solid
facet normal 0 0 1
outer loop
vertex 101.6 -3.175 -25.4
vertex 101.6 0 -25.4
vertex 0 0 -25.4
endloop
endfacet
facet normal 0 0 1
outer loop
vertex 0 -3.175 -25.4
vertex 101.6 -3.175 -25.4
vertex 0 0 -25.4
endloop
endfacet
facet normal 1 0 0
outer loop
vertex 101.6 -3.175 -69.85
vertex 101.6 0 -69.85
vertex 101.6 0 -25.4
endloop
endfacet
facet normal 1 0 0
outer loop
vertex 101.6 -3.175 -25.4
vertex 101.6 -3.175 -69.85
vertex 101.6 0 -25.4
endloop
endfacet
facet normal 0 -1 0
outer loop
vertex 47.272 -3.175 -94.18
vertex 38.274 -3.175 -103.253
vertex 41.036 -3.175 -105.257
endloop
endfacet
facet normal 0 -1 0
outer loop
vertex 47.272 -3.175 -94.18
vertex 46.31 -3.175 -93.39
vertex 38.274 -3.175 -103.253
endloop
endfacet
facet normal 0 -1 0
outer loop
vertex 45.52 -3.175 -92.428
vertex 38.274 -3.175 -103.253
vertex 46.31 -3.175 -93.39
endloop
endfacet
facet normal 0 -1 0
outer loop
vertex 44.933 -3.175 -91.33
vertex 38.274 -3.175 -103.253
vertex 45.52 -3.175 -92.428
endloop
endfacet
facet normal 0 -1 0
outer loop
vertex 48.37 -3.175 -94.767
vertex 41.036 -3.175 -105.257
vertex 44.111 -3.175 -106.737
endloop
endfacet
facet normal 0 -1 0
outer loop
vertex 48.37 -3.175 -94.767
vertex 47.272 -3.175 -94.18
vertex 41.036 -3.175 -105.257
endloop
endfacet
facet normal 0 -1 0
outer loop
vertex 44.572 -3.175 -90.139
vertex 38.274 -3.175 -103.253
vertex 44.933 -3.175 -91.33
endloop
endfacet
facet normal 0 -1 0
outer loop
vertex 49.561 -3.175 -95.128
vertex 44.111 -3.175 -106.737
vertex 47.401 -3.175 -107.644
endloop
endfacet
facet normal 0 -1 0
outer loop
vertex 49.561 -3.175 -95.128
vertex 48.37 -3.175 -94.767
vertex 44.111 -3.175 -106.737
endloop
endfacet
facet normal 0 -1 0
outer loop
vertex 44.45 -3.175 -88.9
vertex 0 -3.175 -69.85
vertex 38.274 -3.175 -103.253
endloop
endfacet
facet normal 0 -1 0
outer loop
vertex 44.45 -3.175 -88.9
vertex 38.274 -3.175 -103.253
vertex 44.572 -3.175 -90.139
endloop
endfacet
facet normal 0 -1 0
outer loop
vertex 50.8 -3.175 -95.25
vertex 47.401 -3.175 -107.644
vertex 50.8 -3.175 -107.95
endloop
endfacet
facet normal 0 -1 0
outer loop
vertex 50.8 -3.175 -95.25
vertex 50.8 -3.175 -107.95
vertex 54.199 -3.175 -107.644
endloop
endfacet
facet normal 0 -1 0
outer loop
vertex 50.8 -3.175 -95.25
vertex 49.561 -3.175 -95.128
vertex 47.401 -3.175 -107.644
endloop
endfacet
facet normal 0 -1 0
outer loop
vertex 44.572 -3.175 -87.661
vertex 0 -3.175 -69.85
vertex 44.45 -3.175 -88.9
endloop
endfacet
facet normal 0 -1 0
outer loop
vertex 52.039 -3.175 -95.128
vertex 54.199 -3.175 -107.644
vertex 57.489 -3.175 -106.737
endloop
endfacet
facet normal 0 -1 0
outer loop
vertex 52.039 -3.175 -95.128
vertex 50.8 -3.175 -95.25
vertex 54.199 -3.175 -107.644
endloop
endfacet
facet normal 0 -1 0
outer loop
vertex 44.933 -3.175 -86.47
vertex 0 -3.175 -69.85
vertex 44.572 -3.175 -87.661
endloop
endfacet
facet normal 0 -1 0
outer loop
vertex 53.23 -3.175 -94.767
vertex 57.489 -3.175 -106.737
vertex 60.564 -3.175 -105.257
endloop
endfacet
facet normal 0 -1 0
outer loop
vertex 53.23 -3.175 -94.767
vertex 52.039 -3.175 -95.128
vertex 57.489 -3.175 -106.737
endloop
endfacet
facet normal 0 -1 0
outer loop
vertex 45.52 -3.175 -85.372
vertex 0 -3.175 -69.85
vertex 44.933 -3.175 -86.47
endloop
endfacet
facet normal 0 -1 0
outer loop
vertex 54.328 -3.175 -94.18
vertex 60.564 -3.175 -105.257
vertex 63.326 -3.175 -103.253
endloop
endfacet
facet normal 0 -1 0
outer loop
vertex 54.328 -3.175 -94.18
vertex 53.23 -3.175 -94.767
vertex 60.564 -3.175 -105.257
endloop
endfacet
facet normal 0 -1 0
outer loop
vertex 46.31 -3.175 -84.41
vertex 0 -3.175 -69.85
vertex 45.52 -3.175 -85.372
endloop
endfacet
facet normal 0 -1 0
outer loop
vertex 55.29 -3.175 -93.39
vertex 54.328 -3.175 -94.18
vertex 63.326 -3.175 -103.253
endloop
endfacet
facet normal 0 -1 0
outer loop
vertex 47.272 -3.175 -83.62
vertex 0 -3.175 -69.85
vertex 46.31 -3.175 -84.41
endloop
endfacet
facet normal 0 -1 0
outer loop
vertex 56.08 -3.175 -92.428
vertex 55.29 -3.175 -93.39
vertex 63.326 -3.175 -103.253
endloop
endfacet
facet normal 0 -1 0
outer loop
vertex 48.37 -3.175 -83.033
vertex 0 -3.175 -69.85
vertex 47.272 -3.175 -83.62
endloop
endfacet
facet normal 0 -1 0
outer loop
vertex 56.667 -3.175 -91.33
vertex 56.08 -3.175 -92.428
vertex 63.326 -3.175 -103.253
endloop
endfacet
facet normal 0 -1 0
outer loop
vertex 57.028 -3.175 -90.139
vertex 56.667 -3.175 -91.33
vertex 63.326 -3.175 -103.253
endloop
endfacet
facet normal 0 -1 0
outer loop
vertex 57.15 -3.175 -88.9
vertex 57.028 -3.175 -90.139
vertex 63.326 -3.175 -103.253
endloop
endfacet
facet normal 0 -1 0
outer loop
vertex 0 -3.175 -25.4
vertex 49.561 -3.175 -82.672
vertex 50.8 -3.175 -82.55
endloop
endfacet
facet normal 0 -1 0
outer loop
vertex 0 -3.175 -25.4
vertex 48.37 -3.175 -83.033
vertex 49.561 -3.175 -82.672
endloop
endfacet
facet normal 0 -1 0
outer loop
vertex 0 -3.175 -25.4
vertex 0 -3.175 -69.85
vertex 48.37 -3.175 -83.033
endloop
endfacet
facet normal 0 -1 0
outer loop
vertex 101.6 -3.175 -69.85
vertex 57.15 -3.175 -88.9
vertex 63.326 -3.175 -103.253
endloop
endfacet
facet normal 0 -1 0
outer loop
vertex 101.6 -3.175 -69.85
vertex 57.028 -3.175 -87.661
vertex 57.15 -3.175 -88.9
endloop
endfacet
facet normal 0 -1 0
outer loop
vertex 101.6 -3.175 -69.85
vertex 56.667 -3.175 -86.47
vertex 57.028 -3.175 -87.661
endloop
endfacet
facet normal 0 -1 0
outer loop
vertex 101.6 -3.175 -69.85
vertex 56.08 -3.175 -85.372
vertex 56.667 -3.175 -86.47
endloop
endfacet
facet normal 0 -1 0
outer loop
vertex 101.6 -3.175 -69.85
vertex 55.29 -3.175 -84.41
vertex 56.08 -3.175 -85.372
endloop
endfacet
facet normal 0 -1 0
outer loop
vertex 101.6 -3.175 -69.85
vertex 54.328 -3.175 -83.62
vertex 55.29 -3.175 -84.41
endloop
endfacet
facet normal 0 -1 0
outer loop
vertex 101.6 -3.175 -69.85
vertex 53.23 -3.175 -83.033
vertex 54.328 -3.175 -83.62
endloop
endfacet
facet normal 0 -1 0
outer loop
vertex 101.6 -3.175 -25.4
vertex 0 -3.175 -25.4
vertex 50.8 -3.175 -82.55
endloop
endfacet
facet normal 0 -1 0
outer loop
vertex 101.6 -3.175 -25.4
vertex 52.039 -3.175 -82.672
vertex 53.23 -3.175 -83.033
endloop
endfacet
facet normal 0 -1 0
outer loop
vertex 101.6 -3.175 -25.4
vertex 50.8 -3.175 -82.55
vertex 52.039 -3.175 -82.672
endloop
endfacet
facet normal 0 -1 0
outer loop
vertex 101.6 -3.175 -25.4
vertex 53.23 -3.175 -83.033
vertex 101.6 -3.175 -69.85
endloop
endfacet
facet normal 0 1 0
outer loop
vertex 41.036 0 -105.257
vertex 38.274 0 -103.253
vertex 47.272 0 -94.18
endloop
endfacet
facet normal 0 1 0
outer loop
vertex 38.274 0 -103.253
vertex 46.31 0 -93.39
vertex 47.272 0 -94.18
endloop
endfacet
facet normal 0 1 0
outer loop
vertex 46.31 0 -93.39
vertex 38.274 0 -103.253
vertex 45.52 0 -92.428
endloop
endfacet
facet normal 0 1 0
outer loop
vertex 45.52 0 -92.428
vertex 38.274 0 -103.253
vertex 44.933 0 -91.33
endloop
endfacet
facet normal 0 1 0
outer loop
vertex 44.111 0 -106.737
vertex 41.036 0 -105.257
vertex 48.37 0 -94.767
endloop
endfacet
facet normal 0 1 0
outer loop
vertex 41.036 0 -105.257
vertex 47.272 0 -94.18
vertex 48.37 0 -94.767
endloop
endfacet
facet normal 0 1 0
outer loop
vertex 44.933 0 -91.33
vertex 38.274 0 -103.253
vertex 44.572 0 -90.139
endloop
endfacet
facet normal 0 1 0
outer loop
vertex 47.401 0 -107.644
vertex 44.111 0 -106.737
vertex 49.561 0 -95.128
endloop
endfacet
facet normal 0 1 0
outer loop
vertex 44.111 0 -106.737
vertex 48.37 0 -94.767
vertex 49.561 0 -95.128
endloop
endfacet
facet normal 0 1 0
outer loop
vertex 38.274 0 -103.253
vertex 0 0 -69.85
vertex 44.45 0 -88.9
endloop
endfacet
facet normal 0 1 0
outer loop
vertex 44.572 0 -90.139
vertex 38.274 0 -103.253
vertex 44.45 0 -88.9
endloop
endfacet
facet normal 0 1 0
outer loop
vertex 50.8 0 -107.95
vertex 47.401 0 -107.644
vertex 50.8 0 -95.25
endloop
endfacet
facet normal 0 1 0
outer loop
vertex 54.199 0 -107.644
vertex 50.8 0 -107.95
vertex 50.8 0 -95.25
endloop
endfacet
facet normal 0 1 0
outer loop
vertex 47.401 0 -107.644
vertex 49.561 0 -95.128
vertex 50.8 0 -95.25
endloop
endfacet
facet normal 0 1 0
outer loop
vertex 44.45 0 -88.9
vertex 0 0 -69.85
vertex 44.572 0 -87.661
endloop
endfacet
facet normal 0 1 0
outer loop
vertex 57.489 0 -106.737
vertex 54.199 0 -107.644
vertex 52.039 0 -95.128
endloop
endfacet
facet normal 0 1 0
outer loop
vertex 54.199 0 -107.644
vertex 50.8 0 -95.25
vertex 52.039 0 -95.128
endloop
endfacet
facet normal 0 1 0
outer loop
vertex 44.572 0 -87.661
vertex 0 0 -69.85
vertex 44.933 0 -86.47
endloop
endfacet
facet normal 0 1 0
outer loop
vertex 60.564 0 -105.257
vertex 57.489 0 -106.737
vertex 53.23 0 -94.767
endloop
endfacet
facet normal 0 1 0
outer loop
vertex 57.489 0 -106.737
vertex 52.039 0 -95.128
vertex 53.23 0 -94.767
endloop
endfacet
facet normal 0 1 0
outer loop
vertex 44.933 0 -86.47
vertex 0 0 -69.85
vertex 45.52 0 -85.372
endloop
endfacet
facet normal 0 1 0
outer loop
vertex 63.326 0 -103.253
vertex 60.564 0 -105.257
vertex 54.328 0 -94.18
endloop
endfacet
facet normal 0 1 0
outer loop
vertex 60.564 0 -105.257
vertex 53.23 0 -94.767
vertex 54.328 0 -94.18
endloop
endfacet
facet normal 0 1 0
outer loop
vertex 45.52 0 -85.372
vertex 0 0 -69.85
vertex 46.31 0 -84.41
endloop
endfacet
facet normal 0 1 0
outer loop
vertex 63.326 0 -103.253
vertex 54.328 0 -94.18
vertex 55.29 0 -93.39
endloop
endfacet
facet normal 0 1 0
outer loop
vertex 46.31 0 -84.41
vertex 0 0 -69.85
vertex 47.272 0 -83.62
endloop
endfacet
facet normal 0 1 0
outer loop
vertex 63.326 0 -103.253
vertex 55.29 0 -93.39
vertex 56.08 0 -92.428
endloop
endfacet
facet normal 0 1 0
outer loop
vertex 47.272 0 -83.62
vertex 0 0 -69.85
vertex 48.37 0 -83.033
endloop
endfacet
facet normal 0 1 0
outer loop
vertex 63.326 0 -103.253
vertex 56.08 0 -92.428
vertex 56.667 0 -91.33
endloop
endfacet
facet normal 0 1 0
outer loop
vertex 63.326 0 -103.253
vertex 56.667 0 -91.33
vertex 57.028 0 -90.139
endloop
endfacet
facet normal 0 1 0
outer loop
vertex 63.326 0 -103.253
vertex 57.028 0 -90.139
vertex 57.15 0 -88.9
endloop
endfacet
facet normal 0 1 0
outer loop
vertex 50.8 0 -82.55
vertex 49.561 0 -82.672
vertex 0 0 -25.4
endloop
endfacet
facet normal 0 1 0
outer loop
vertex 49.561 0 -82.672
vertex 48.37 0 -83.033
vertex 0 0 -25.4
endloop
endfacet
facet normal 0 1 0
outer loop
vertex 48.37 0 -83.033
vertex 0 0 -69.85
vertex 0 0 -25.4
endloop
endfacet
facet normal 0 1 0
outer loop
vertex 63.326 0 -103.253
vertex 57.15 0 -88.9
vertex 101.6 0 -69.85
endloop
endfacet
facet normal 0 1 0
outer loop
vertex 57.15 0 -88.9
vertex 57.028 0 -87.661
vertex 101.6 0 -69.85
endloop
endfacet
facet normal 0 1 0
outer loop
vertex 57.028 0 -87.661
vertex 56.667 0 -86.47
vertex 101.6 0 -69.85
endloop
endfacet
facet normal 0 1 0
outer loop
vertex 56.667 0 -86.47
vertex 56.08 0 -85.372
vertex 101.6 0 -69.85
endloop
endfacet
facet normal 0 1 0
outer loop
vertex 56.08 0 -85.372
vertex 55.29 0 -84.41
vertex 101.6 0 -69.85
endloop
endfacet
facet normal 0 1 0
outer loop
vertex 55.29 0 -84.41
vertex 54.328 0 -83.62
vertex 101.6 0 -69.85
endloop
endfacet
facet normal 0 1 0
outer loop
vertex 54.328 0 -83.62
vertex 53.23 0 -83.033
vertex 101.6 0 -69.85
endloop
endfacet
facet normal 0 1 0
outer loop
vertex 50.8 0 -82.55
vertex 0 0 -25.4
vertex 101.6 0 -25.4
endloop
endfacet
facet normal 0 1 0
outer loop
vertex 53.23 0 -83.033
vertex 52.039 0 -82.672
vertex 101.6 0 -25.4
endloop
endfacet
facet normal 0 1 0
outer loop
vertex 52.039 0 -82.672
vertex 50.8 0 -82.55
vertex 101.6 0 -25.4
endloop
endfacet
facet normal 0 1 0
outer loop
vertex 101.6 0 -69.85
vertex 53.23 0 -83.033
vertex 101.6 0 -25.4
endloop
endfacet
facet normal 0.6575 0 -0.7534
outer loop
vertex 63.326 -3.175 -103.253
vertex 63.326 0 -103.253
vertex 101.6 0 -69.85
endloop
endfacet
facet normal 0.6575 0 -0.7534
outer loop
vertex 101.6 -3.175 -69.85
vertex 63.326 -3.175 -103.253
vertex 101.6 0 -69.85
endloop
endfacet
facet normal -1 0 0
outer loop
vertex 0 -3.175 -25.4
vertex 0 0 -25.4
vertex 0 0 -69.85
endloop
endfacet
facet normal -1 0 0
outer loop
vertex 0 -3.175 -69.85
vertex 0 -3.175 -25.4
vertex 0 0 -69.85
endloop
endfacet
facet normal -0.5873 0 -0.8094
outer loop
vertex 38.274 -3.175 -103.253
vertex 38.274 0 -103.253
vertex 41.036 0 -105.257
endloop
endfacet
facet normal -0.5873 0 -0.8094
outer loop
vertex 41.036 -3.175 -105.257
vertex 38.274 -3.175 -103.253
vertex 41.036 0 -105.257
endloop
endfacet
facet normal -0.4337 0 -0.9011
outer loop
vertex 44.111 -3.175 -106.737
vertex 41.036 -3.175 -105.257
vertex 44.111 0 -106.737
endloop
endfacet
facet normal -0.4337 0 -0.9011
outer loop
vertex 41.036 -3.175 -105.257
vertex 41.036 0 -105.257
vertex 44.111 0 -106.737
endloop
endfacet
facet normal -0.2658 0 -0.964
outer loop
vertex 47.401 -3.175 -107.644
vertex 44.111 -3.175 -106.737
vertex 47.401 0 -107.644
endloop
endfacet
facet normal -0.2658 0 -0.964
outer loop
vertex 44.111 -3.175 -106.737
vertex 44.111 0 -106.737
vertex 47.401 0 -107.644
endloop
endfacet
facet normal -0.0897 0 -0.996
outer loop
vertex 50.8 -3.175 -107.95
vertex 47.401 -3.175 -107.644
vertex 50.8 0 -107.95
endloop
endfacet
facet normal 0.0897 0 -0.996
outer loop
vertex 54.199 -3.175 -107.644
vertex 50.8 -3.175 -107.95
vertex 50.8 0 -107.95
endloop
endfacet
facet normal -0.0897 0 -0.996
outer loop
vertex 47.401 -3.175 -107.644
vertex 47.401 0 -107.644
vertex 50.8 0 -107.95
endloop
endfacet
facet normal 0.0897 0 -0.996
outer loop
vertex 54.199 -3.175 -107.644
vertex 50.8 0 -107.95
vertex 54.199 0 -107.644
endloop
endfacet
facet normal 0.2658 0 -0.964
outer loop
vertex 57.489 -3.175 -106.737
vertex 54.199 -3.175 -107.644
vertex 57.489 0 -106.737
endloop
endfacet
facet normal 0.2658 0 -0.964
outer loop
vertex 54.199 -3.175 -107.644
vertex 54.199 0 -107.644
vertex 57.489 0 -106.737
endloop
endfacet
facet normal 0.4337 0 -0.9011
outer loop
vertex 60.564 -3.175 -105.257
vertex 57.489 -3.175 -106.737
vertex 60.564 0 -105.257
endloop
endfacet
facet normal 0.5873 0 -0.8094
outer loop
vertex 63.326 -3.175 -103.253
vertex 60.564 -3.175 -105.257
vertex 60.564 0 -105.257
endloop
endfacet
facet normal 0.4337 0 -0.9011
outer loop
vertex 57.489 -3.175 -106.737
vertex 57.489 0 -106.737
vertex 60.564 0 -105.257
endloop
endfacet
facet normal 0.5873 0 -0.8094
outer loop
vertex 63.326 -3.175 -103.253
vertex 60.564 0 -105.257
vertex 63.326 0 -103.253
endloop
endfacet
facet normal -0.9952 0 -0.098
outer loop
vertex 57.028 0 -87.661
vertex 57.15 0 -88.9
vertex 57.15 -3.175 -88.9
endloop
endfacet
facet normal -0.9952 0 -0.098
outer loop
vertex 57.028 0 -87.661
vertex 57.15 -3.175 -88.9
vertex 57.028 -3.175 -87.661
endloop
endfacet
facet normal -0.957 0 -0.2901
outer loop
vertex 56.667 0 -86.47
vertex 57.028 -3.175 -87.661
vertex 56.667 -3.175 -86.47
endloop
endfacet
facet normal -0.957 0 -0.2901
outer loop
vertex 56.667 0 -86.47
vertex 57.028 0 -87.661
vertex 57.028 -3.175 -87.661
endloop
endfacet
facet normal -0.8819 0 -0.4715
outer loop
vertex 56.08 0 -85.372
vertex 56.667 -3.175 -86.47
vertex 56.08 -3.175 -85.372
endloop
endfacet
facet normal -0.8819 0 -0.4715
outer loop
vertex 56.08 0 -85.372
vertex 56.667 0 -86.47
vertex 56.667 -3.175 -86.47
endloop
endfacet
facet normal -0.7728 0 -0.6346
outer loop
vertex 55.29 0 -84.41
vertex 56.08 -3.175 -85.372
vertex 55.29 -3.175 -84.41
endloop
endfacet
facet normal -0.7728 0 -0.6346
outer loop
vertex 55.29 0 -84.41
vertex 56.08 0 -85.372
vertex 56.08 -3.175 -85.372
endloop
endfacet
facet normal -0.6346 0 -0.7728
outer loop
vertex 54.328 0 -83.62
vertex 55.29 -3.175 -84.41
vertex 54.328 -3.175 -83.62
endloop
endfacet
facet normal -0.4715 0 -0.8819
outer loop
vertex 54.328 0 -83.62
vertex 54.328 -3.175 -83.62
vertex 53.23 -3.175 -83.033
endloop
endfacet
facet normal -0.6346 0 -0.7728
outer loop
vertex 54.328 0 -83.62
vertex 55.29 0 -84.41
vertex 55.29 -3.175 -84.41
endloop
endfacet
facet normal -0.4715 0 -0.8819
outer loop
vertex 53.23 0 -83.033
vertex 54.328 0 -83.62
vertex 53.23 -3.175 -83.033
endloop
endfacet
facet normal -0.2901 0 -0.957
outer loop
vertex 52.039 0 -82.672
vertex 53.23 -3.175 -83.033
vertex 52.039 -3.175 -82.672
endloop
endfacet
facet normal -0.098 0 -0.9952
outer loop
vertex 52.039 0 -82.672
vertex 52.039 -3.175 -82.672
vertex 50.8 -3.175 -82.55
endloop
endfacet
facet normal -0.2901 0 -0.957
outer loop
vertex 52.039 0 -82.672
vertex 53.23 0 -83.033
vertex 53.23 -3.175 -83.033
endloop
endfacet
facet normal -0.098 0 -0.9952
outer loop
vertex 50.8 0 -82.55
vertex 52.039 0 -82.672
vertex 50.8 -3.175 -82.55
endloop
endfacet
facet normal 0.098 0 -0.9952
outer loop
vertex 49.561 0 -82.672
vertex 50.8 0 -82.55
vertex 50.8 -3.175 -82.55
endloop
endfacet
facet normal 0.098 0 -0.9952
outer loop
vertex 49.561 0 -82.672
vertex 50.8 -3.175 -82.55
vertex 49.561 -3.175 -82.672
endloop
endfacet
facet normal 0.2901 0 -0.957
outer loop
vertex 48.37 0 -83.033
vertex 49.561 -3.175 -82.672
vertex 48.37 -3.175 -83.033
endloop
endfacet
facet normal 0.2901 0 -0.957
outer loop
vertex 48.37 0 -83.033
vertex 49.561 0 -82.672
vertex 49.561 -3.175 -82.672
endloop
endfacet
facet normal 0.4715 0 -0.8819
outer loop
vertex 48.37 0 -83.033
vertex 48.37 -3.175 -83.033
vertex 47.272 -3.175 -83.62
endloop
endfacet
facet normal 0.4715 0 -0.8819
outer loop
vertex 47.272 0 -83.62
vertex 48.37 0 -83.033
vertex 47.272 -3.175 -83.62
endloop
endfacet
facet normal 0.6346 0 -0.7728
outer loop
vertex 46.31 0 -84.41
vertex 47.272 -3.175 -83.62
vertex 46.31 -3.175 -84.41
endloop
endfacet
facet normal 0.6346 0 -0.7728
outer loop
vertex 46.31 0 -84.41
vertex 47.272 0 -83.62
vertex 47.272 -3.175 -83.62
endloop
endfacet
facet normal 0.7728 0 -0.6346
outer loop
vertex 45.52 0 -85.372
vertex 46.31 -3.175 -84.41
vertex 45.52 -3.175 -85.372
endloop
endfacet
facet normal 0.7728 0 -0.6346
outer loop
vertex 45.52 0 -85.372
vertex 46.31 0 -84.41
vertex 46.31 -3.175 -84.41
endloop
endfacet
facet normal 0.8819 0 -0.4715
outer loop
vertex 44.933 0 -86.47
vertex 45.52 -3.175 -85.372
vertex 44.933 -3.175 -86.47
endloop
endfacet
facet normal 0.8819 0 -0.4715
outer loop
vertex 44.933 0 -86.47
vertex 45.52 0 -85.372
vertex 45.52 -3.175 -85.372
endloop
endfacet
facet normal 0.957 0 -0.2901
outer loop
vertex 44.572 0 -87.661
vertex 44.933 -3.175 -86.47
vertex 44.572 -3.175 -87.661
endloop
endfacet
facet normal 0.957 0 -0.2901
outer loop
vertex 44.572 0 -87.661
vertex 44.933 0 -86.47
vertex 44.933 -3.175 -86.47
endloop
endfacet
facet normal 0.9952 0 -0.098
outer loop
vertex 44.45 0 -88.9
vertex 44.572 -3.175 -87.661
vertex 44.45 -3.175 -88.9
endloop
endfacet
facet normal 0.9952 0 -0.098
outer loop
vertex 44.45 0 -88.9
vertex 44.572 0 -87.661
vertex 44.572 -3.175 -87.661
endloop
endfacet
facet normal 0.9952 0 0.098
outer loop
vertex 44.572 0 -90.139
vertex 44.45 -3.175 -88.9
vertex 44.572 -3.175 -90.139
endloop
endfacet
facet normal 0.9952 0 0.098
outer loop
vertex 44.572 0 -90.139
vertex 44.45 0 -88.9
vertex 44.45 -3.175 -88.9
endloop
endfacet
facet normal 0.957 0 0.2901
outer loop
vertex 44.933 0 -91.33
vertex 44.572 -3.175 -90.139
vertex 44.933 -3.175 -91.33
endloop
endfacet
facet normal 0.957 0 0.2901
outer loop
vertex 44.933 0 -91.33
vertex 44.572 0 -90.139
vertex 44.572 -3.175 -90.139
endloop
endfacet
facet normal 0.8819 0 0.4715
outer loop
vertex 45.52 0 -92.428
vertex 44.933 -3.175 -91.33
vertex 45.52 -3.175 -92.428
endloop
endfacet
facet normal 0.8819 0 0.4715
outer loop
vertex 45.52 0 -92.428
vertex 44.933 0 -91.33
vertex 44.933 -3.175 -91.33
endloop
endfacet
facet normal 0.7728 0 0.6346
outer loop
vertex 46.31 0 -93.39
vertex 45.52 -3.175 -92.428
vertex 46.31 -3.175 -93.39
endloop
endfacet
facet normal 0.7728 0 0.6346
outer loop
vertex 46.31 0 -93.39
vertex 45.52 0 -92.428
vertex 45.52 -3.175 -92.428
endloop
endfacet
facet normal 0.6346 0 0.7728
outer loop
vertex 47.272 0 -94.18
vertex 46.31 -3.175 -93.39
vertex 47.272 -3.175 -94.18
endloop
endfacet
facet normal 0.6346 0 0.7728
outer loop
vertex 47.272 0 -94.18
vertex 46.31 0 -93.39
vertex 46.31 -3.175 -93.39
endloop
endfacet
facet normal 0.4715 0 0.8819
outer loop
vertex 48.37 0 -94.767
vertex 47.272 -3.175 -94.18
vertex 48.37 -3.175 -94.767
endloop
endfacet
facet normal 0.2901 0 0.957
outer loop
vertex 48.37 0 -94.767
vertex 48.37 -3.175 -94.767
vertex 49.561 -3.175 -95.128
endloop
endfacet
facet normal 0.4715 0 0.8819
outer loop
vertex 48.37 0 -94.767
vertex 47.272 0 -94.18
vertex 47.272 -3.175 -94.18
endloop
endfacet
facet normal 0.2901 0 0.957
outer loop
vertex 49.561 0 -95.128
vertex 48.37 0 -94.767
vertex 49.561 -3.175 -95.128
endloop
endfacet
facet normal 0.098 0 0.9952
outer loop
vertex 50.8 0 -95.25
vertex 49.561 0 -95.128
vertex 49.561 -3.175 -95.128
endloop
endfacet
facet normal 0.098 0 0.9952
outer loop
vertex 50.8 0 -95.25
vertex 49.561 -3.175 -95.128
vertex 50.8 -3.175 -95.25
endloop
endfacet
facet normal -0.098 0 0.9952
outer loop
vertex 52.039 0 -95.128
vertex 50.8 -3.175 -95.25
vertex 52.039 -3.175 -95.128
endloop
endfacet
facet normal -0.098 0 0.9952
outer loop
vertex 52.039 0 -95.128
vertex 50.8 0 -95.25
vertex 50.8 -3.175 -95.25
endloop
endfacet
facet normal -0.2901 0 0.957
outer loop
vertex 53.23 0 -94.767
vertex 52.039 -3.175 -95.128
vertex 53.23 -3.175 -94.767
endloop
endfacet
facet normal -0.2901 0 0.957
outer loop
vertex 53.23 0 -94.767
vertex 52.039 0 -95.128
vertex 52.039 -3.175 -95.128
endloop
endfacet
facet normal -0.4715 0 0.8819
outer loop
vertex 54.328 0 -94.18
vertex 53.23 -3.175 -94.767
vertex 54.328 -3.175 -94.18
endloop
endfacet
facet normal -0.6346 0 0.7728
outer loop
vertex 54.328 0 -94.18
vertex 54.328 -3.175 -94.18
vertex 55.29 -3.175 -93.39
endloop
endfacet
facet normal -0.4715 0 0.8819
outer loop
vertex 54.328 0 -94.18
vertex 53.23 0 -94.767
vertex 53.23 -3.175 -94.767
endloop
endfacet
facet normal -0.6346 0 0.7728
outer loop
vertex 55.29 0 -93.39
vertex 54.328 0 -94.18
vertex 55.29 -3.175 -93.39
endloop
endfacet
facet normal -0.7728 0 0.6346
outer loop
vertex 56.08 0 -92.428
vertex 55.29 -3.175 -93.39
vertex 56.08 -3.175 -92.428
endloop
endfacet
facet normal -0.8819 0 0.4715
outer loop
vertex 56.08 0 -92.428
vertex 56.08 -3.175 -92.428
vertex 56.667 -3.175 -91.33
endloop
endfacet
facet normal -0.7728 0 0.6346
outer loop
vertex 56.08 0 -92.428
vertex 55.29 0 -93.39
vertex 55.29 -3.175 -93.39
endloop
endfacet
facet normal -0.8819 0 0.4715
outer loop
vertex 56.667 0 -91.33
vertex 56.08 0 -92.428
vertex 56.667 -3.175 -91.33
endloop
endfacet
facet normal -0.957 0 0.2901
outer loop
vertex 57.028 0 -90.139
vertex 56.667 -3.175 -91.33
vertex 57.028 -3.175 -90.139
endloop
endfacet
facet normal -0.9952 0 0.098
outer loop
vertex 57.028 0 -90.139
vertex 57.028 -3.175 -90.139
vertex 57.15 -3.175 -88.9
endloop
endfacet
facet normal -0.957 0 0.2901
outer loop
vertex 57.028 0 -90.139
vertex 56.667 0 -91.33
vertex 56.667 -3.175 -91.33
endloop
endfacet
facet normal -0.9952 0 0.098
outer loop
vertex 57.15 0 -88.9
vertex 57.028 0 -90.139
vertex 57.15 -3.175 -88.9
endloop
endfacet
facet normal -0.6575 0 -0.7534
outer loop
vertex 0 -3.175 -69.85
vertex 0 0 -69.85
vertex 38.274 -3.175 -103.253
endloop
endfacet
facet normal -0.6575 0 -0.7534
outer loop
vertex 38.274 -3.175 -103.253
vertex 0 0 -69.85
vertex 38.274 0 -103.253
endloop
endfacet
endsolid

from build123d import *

# Parameters (mm, degrees)
F0_R     = 6.35
F1_DEPTH = 3.175


with BuildPart() as f1:
    # F0 (on Front) → F1 (new body)
    with BuildSketch(Plane.XZ):
        Polygon((101.6, -25.4), (0, -25.4), (0, -69.85), (50.8, -69.85), (101.6, -69.85), align=None)
        with BuildLine():
            Line((50.8, -69.85), (0, -69.85))
            Line((0, -69.85), (38.273973, -103.25274))
            ThreePointArc((38.273973, -103.25274), (32.962929, -82.211098), (50.8, -69.85))
        make_face()
        with BuildLine():
            Line((63.326027, -103.25274), (101.6, -69.85))
            Line((101.6, -69.85), (50.8, -69.85))
            ThreePointArc((50.8, -69.85), (64.270384, -75.429616), (69.85, -88.9))
            ThreePointArc((69.85, -88.9), (68.142481, -96.782946), (63.326027, -103.25274))
        make_face()
        with BuildLine():
            ThreePointArc((69.85, -88.9), (64.270384, -75.429616), (50.8, -69.85))
            ThreePointArc((50.8, -69.85), (32.962929, -82.211098), (38.273973, -103.25274))
            ThreePointArc((38.273973, -103.25274), (50.8, -107.95), (63.326027, -103.25274))
            ThreePointArc((63.326027, -103.25274), (68.142481, -96.782946), (69.85, -88.9))
        make_face()
        with Locations((50.8, -88.9)):
            Circle(F0_R, mode=Mode.SUBTRACT)
    extrude(amount=F1_DEPTH)


solid = f1.part
